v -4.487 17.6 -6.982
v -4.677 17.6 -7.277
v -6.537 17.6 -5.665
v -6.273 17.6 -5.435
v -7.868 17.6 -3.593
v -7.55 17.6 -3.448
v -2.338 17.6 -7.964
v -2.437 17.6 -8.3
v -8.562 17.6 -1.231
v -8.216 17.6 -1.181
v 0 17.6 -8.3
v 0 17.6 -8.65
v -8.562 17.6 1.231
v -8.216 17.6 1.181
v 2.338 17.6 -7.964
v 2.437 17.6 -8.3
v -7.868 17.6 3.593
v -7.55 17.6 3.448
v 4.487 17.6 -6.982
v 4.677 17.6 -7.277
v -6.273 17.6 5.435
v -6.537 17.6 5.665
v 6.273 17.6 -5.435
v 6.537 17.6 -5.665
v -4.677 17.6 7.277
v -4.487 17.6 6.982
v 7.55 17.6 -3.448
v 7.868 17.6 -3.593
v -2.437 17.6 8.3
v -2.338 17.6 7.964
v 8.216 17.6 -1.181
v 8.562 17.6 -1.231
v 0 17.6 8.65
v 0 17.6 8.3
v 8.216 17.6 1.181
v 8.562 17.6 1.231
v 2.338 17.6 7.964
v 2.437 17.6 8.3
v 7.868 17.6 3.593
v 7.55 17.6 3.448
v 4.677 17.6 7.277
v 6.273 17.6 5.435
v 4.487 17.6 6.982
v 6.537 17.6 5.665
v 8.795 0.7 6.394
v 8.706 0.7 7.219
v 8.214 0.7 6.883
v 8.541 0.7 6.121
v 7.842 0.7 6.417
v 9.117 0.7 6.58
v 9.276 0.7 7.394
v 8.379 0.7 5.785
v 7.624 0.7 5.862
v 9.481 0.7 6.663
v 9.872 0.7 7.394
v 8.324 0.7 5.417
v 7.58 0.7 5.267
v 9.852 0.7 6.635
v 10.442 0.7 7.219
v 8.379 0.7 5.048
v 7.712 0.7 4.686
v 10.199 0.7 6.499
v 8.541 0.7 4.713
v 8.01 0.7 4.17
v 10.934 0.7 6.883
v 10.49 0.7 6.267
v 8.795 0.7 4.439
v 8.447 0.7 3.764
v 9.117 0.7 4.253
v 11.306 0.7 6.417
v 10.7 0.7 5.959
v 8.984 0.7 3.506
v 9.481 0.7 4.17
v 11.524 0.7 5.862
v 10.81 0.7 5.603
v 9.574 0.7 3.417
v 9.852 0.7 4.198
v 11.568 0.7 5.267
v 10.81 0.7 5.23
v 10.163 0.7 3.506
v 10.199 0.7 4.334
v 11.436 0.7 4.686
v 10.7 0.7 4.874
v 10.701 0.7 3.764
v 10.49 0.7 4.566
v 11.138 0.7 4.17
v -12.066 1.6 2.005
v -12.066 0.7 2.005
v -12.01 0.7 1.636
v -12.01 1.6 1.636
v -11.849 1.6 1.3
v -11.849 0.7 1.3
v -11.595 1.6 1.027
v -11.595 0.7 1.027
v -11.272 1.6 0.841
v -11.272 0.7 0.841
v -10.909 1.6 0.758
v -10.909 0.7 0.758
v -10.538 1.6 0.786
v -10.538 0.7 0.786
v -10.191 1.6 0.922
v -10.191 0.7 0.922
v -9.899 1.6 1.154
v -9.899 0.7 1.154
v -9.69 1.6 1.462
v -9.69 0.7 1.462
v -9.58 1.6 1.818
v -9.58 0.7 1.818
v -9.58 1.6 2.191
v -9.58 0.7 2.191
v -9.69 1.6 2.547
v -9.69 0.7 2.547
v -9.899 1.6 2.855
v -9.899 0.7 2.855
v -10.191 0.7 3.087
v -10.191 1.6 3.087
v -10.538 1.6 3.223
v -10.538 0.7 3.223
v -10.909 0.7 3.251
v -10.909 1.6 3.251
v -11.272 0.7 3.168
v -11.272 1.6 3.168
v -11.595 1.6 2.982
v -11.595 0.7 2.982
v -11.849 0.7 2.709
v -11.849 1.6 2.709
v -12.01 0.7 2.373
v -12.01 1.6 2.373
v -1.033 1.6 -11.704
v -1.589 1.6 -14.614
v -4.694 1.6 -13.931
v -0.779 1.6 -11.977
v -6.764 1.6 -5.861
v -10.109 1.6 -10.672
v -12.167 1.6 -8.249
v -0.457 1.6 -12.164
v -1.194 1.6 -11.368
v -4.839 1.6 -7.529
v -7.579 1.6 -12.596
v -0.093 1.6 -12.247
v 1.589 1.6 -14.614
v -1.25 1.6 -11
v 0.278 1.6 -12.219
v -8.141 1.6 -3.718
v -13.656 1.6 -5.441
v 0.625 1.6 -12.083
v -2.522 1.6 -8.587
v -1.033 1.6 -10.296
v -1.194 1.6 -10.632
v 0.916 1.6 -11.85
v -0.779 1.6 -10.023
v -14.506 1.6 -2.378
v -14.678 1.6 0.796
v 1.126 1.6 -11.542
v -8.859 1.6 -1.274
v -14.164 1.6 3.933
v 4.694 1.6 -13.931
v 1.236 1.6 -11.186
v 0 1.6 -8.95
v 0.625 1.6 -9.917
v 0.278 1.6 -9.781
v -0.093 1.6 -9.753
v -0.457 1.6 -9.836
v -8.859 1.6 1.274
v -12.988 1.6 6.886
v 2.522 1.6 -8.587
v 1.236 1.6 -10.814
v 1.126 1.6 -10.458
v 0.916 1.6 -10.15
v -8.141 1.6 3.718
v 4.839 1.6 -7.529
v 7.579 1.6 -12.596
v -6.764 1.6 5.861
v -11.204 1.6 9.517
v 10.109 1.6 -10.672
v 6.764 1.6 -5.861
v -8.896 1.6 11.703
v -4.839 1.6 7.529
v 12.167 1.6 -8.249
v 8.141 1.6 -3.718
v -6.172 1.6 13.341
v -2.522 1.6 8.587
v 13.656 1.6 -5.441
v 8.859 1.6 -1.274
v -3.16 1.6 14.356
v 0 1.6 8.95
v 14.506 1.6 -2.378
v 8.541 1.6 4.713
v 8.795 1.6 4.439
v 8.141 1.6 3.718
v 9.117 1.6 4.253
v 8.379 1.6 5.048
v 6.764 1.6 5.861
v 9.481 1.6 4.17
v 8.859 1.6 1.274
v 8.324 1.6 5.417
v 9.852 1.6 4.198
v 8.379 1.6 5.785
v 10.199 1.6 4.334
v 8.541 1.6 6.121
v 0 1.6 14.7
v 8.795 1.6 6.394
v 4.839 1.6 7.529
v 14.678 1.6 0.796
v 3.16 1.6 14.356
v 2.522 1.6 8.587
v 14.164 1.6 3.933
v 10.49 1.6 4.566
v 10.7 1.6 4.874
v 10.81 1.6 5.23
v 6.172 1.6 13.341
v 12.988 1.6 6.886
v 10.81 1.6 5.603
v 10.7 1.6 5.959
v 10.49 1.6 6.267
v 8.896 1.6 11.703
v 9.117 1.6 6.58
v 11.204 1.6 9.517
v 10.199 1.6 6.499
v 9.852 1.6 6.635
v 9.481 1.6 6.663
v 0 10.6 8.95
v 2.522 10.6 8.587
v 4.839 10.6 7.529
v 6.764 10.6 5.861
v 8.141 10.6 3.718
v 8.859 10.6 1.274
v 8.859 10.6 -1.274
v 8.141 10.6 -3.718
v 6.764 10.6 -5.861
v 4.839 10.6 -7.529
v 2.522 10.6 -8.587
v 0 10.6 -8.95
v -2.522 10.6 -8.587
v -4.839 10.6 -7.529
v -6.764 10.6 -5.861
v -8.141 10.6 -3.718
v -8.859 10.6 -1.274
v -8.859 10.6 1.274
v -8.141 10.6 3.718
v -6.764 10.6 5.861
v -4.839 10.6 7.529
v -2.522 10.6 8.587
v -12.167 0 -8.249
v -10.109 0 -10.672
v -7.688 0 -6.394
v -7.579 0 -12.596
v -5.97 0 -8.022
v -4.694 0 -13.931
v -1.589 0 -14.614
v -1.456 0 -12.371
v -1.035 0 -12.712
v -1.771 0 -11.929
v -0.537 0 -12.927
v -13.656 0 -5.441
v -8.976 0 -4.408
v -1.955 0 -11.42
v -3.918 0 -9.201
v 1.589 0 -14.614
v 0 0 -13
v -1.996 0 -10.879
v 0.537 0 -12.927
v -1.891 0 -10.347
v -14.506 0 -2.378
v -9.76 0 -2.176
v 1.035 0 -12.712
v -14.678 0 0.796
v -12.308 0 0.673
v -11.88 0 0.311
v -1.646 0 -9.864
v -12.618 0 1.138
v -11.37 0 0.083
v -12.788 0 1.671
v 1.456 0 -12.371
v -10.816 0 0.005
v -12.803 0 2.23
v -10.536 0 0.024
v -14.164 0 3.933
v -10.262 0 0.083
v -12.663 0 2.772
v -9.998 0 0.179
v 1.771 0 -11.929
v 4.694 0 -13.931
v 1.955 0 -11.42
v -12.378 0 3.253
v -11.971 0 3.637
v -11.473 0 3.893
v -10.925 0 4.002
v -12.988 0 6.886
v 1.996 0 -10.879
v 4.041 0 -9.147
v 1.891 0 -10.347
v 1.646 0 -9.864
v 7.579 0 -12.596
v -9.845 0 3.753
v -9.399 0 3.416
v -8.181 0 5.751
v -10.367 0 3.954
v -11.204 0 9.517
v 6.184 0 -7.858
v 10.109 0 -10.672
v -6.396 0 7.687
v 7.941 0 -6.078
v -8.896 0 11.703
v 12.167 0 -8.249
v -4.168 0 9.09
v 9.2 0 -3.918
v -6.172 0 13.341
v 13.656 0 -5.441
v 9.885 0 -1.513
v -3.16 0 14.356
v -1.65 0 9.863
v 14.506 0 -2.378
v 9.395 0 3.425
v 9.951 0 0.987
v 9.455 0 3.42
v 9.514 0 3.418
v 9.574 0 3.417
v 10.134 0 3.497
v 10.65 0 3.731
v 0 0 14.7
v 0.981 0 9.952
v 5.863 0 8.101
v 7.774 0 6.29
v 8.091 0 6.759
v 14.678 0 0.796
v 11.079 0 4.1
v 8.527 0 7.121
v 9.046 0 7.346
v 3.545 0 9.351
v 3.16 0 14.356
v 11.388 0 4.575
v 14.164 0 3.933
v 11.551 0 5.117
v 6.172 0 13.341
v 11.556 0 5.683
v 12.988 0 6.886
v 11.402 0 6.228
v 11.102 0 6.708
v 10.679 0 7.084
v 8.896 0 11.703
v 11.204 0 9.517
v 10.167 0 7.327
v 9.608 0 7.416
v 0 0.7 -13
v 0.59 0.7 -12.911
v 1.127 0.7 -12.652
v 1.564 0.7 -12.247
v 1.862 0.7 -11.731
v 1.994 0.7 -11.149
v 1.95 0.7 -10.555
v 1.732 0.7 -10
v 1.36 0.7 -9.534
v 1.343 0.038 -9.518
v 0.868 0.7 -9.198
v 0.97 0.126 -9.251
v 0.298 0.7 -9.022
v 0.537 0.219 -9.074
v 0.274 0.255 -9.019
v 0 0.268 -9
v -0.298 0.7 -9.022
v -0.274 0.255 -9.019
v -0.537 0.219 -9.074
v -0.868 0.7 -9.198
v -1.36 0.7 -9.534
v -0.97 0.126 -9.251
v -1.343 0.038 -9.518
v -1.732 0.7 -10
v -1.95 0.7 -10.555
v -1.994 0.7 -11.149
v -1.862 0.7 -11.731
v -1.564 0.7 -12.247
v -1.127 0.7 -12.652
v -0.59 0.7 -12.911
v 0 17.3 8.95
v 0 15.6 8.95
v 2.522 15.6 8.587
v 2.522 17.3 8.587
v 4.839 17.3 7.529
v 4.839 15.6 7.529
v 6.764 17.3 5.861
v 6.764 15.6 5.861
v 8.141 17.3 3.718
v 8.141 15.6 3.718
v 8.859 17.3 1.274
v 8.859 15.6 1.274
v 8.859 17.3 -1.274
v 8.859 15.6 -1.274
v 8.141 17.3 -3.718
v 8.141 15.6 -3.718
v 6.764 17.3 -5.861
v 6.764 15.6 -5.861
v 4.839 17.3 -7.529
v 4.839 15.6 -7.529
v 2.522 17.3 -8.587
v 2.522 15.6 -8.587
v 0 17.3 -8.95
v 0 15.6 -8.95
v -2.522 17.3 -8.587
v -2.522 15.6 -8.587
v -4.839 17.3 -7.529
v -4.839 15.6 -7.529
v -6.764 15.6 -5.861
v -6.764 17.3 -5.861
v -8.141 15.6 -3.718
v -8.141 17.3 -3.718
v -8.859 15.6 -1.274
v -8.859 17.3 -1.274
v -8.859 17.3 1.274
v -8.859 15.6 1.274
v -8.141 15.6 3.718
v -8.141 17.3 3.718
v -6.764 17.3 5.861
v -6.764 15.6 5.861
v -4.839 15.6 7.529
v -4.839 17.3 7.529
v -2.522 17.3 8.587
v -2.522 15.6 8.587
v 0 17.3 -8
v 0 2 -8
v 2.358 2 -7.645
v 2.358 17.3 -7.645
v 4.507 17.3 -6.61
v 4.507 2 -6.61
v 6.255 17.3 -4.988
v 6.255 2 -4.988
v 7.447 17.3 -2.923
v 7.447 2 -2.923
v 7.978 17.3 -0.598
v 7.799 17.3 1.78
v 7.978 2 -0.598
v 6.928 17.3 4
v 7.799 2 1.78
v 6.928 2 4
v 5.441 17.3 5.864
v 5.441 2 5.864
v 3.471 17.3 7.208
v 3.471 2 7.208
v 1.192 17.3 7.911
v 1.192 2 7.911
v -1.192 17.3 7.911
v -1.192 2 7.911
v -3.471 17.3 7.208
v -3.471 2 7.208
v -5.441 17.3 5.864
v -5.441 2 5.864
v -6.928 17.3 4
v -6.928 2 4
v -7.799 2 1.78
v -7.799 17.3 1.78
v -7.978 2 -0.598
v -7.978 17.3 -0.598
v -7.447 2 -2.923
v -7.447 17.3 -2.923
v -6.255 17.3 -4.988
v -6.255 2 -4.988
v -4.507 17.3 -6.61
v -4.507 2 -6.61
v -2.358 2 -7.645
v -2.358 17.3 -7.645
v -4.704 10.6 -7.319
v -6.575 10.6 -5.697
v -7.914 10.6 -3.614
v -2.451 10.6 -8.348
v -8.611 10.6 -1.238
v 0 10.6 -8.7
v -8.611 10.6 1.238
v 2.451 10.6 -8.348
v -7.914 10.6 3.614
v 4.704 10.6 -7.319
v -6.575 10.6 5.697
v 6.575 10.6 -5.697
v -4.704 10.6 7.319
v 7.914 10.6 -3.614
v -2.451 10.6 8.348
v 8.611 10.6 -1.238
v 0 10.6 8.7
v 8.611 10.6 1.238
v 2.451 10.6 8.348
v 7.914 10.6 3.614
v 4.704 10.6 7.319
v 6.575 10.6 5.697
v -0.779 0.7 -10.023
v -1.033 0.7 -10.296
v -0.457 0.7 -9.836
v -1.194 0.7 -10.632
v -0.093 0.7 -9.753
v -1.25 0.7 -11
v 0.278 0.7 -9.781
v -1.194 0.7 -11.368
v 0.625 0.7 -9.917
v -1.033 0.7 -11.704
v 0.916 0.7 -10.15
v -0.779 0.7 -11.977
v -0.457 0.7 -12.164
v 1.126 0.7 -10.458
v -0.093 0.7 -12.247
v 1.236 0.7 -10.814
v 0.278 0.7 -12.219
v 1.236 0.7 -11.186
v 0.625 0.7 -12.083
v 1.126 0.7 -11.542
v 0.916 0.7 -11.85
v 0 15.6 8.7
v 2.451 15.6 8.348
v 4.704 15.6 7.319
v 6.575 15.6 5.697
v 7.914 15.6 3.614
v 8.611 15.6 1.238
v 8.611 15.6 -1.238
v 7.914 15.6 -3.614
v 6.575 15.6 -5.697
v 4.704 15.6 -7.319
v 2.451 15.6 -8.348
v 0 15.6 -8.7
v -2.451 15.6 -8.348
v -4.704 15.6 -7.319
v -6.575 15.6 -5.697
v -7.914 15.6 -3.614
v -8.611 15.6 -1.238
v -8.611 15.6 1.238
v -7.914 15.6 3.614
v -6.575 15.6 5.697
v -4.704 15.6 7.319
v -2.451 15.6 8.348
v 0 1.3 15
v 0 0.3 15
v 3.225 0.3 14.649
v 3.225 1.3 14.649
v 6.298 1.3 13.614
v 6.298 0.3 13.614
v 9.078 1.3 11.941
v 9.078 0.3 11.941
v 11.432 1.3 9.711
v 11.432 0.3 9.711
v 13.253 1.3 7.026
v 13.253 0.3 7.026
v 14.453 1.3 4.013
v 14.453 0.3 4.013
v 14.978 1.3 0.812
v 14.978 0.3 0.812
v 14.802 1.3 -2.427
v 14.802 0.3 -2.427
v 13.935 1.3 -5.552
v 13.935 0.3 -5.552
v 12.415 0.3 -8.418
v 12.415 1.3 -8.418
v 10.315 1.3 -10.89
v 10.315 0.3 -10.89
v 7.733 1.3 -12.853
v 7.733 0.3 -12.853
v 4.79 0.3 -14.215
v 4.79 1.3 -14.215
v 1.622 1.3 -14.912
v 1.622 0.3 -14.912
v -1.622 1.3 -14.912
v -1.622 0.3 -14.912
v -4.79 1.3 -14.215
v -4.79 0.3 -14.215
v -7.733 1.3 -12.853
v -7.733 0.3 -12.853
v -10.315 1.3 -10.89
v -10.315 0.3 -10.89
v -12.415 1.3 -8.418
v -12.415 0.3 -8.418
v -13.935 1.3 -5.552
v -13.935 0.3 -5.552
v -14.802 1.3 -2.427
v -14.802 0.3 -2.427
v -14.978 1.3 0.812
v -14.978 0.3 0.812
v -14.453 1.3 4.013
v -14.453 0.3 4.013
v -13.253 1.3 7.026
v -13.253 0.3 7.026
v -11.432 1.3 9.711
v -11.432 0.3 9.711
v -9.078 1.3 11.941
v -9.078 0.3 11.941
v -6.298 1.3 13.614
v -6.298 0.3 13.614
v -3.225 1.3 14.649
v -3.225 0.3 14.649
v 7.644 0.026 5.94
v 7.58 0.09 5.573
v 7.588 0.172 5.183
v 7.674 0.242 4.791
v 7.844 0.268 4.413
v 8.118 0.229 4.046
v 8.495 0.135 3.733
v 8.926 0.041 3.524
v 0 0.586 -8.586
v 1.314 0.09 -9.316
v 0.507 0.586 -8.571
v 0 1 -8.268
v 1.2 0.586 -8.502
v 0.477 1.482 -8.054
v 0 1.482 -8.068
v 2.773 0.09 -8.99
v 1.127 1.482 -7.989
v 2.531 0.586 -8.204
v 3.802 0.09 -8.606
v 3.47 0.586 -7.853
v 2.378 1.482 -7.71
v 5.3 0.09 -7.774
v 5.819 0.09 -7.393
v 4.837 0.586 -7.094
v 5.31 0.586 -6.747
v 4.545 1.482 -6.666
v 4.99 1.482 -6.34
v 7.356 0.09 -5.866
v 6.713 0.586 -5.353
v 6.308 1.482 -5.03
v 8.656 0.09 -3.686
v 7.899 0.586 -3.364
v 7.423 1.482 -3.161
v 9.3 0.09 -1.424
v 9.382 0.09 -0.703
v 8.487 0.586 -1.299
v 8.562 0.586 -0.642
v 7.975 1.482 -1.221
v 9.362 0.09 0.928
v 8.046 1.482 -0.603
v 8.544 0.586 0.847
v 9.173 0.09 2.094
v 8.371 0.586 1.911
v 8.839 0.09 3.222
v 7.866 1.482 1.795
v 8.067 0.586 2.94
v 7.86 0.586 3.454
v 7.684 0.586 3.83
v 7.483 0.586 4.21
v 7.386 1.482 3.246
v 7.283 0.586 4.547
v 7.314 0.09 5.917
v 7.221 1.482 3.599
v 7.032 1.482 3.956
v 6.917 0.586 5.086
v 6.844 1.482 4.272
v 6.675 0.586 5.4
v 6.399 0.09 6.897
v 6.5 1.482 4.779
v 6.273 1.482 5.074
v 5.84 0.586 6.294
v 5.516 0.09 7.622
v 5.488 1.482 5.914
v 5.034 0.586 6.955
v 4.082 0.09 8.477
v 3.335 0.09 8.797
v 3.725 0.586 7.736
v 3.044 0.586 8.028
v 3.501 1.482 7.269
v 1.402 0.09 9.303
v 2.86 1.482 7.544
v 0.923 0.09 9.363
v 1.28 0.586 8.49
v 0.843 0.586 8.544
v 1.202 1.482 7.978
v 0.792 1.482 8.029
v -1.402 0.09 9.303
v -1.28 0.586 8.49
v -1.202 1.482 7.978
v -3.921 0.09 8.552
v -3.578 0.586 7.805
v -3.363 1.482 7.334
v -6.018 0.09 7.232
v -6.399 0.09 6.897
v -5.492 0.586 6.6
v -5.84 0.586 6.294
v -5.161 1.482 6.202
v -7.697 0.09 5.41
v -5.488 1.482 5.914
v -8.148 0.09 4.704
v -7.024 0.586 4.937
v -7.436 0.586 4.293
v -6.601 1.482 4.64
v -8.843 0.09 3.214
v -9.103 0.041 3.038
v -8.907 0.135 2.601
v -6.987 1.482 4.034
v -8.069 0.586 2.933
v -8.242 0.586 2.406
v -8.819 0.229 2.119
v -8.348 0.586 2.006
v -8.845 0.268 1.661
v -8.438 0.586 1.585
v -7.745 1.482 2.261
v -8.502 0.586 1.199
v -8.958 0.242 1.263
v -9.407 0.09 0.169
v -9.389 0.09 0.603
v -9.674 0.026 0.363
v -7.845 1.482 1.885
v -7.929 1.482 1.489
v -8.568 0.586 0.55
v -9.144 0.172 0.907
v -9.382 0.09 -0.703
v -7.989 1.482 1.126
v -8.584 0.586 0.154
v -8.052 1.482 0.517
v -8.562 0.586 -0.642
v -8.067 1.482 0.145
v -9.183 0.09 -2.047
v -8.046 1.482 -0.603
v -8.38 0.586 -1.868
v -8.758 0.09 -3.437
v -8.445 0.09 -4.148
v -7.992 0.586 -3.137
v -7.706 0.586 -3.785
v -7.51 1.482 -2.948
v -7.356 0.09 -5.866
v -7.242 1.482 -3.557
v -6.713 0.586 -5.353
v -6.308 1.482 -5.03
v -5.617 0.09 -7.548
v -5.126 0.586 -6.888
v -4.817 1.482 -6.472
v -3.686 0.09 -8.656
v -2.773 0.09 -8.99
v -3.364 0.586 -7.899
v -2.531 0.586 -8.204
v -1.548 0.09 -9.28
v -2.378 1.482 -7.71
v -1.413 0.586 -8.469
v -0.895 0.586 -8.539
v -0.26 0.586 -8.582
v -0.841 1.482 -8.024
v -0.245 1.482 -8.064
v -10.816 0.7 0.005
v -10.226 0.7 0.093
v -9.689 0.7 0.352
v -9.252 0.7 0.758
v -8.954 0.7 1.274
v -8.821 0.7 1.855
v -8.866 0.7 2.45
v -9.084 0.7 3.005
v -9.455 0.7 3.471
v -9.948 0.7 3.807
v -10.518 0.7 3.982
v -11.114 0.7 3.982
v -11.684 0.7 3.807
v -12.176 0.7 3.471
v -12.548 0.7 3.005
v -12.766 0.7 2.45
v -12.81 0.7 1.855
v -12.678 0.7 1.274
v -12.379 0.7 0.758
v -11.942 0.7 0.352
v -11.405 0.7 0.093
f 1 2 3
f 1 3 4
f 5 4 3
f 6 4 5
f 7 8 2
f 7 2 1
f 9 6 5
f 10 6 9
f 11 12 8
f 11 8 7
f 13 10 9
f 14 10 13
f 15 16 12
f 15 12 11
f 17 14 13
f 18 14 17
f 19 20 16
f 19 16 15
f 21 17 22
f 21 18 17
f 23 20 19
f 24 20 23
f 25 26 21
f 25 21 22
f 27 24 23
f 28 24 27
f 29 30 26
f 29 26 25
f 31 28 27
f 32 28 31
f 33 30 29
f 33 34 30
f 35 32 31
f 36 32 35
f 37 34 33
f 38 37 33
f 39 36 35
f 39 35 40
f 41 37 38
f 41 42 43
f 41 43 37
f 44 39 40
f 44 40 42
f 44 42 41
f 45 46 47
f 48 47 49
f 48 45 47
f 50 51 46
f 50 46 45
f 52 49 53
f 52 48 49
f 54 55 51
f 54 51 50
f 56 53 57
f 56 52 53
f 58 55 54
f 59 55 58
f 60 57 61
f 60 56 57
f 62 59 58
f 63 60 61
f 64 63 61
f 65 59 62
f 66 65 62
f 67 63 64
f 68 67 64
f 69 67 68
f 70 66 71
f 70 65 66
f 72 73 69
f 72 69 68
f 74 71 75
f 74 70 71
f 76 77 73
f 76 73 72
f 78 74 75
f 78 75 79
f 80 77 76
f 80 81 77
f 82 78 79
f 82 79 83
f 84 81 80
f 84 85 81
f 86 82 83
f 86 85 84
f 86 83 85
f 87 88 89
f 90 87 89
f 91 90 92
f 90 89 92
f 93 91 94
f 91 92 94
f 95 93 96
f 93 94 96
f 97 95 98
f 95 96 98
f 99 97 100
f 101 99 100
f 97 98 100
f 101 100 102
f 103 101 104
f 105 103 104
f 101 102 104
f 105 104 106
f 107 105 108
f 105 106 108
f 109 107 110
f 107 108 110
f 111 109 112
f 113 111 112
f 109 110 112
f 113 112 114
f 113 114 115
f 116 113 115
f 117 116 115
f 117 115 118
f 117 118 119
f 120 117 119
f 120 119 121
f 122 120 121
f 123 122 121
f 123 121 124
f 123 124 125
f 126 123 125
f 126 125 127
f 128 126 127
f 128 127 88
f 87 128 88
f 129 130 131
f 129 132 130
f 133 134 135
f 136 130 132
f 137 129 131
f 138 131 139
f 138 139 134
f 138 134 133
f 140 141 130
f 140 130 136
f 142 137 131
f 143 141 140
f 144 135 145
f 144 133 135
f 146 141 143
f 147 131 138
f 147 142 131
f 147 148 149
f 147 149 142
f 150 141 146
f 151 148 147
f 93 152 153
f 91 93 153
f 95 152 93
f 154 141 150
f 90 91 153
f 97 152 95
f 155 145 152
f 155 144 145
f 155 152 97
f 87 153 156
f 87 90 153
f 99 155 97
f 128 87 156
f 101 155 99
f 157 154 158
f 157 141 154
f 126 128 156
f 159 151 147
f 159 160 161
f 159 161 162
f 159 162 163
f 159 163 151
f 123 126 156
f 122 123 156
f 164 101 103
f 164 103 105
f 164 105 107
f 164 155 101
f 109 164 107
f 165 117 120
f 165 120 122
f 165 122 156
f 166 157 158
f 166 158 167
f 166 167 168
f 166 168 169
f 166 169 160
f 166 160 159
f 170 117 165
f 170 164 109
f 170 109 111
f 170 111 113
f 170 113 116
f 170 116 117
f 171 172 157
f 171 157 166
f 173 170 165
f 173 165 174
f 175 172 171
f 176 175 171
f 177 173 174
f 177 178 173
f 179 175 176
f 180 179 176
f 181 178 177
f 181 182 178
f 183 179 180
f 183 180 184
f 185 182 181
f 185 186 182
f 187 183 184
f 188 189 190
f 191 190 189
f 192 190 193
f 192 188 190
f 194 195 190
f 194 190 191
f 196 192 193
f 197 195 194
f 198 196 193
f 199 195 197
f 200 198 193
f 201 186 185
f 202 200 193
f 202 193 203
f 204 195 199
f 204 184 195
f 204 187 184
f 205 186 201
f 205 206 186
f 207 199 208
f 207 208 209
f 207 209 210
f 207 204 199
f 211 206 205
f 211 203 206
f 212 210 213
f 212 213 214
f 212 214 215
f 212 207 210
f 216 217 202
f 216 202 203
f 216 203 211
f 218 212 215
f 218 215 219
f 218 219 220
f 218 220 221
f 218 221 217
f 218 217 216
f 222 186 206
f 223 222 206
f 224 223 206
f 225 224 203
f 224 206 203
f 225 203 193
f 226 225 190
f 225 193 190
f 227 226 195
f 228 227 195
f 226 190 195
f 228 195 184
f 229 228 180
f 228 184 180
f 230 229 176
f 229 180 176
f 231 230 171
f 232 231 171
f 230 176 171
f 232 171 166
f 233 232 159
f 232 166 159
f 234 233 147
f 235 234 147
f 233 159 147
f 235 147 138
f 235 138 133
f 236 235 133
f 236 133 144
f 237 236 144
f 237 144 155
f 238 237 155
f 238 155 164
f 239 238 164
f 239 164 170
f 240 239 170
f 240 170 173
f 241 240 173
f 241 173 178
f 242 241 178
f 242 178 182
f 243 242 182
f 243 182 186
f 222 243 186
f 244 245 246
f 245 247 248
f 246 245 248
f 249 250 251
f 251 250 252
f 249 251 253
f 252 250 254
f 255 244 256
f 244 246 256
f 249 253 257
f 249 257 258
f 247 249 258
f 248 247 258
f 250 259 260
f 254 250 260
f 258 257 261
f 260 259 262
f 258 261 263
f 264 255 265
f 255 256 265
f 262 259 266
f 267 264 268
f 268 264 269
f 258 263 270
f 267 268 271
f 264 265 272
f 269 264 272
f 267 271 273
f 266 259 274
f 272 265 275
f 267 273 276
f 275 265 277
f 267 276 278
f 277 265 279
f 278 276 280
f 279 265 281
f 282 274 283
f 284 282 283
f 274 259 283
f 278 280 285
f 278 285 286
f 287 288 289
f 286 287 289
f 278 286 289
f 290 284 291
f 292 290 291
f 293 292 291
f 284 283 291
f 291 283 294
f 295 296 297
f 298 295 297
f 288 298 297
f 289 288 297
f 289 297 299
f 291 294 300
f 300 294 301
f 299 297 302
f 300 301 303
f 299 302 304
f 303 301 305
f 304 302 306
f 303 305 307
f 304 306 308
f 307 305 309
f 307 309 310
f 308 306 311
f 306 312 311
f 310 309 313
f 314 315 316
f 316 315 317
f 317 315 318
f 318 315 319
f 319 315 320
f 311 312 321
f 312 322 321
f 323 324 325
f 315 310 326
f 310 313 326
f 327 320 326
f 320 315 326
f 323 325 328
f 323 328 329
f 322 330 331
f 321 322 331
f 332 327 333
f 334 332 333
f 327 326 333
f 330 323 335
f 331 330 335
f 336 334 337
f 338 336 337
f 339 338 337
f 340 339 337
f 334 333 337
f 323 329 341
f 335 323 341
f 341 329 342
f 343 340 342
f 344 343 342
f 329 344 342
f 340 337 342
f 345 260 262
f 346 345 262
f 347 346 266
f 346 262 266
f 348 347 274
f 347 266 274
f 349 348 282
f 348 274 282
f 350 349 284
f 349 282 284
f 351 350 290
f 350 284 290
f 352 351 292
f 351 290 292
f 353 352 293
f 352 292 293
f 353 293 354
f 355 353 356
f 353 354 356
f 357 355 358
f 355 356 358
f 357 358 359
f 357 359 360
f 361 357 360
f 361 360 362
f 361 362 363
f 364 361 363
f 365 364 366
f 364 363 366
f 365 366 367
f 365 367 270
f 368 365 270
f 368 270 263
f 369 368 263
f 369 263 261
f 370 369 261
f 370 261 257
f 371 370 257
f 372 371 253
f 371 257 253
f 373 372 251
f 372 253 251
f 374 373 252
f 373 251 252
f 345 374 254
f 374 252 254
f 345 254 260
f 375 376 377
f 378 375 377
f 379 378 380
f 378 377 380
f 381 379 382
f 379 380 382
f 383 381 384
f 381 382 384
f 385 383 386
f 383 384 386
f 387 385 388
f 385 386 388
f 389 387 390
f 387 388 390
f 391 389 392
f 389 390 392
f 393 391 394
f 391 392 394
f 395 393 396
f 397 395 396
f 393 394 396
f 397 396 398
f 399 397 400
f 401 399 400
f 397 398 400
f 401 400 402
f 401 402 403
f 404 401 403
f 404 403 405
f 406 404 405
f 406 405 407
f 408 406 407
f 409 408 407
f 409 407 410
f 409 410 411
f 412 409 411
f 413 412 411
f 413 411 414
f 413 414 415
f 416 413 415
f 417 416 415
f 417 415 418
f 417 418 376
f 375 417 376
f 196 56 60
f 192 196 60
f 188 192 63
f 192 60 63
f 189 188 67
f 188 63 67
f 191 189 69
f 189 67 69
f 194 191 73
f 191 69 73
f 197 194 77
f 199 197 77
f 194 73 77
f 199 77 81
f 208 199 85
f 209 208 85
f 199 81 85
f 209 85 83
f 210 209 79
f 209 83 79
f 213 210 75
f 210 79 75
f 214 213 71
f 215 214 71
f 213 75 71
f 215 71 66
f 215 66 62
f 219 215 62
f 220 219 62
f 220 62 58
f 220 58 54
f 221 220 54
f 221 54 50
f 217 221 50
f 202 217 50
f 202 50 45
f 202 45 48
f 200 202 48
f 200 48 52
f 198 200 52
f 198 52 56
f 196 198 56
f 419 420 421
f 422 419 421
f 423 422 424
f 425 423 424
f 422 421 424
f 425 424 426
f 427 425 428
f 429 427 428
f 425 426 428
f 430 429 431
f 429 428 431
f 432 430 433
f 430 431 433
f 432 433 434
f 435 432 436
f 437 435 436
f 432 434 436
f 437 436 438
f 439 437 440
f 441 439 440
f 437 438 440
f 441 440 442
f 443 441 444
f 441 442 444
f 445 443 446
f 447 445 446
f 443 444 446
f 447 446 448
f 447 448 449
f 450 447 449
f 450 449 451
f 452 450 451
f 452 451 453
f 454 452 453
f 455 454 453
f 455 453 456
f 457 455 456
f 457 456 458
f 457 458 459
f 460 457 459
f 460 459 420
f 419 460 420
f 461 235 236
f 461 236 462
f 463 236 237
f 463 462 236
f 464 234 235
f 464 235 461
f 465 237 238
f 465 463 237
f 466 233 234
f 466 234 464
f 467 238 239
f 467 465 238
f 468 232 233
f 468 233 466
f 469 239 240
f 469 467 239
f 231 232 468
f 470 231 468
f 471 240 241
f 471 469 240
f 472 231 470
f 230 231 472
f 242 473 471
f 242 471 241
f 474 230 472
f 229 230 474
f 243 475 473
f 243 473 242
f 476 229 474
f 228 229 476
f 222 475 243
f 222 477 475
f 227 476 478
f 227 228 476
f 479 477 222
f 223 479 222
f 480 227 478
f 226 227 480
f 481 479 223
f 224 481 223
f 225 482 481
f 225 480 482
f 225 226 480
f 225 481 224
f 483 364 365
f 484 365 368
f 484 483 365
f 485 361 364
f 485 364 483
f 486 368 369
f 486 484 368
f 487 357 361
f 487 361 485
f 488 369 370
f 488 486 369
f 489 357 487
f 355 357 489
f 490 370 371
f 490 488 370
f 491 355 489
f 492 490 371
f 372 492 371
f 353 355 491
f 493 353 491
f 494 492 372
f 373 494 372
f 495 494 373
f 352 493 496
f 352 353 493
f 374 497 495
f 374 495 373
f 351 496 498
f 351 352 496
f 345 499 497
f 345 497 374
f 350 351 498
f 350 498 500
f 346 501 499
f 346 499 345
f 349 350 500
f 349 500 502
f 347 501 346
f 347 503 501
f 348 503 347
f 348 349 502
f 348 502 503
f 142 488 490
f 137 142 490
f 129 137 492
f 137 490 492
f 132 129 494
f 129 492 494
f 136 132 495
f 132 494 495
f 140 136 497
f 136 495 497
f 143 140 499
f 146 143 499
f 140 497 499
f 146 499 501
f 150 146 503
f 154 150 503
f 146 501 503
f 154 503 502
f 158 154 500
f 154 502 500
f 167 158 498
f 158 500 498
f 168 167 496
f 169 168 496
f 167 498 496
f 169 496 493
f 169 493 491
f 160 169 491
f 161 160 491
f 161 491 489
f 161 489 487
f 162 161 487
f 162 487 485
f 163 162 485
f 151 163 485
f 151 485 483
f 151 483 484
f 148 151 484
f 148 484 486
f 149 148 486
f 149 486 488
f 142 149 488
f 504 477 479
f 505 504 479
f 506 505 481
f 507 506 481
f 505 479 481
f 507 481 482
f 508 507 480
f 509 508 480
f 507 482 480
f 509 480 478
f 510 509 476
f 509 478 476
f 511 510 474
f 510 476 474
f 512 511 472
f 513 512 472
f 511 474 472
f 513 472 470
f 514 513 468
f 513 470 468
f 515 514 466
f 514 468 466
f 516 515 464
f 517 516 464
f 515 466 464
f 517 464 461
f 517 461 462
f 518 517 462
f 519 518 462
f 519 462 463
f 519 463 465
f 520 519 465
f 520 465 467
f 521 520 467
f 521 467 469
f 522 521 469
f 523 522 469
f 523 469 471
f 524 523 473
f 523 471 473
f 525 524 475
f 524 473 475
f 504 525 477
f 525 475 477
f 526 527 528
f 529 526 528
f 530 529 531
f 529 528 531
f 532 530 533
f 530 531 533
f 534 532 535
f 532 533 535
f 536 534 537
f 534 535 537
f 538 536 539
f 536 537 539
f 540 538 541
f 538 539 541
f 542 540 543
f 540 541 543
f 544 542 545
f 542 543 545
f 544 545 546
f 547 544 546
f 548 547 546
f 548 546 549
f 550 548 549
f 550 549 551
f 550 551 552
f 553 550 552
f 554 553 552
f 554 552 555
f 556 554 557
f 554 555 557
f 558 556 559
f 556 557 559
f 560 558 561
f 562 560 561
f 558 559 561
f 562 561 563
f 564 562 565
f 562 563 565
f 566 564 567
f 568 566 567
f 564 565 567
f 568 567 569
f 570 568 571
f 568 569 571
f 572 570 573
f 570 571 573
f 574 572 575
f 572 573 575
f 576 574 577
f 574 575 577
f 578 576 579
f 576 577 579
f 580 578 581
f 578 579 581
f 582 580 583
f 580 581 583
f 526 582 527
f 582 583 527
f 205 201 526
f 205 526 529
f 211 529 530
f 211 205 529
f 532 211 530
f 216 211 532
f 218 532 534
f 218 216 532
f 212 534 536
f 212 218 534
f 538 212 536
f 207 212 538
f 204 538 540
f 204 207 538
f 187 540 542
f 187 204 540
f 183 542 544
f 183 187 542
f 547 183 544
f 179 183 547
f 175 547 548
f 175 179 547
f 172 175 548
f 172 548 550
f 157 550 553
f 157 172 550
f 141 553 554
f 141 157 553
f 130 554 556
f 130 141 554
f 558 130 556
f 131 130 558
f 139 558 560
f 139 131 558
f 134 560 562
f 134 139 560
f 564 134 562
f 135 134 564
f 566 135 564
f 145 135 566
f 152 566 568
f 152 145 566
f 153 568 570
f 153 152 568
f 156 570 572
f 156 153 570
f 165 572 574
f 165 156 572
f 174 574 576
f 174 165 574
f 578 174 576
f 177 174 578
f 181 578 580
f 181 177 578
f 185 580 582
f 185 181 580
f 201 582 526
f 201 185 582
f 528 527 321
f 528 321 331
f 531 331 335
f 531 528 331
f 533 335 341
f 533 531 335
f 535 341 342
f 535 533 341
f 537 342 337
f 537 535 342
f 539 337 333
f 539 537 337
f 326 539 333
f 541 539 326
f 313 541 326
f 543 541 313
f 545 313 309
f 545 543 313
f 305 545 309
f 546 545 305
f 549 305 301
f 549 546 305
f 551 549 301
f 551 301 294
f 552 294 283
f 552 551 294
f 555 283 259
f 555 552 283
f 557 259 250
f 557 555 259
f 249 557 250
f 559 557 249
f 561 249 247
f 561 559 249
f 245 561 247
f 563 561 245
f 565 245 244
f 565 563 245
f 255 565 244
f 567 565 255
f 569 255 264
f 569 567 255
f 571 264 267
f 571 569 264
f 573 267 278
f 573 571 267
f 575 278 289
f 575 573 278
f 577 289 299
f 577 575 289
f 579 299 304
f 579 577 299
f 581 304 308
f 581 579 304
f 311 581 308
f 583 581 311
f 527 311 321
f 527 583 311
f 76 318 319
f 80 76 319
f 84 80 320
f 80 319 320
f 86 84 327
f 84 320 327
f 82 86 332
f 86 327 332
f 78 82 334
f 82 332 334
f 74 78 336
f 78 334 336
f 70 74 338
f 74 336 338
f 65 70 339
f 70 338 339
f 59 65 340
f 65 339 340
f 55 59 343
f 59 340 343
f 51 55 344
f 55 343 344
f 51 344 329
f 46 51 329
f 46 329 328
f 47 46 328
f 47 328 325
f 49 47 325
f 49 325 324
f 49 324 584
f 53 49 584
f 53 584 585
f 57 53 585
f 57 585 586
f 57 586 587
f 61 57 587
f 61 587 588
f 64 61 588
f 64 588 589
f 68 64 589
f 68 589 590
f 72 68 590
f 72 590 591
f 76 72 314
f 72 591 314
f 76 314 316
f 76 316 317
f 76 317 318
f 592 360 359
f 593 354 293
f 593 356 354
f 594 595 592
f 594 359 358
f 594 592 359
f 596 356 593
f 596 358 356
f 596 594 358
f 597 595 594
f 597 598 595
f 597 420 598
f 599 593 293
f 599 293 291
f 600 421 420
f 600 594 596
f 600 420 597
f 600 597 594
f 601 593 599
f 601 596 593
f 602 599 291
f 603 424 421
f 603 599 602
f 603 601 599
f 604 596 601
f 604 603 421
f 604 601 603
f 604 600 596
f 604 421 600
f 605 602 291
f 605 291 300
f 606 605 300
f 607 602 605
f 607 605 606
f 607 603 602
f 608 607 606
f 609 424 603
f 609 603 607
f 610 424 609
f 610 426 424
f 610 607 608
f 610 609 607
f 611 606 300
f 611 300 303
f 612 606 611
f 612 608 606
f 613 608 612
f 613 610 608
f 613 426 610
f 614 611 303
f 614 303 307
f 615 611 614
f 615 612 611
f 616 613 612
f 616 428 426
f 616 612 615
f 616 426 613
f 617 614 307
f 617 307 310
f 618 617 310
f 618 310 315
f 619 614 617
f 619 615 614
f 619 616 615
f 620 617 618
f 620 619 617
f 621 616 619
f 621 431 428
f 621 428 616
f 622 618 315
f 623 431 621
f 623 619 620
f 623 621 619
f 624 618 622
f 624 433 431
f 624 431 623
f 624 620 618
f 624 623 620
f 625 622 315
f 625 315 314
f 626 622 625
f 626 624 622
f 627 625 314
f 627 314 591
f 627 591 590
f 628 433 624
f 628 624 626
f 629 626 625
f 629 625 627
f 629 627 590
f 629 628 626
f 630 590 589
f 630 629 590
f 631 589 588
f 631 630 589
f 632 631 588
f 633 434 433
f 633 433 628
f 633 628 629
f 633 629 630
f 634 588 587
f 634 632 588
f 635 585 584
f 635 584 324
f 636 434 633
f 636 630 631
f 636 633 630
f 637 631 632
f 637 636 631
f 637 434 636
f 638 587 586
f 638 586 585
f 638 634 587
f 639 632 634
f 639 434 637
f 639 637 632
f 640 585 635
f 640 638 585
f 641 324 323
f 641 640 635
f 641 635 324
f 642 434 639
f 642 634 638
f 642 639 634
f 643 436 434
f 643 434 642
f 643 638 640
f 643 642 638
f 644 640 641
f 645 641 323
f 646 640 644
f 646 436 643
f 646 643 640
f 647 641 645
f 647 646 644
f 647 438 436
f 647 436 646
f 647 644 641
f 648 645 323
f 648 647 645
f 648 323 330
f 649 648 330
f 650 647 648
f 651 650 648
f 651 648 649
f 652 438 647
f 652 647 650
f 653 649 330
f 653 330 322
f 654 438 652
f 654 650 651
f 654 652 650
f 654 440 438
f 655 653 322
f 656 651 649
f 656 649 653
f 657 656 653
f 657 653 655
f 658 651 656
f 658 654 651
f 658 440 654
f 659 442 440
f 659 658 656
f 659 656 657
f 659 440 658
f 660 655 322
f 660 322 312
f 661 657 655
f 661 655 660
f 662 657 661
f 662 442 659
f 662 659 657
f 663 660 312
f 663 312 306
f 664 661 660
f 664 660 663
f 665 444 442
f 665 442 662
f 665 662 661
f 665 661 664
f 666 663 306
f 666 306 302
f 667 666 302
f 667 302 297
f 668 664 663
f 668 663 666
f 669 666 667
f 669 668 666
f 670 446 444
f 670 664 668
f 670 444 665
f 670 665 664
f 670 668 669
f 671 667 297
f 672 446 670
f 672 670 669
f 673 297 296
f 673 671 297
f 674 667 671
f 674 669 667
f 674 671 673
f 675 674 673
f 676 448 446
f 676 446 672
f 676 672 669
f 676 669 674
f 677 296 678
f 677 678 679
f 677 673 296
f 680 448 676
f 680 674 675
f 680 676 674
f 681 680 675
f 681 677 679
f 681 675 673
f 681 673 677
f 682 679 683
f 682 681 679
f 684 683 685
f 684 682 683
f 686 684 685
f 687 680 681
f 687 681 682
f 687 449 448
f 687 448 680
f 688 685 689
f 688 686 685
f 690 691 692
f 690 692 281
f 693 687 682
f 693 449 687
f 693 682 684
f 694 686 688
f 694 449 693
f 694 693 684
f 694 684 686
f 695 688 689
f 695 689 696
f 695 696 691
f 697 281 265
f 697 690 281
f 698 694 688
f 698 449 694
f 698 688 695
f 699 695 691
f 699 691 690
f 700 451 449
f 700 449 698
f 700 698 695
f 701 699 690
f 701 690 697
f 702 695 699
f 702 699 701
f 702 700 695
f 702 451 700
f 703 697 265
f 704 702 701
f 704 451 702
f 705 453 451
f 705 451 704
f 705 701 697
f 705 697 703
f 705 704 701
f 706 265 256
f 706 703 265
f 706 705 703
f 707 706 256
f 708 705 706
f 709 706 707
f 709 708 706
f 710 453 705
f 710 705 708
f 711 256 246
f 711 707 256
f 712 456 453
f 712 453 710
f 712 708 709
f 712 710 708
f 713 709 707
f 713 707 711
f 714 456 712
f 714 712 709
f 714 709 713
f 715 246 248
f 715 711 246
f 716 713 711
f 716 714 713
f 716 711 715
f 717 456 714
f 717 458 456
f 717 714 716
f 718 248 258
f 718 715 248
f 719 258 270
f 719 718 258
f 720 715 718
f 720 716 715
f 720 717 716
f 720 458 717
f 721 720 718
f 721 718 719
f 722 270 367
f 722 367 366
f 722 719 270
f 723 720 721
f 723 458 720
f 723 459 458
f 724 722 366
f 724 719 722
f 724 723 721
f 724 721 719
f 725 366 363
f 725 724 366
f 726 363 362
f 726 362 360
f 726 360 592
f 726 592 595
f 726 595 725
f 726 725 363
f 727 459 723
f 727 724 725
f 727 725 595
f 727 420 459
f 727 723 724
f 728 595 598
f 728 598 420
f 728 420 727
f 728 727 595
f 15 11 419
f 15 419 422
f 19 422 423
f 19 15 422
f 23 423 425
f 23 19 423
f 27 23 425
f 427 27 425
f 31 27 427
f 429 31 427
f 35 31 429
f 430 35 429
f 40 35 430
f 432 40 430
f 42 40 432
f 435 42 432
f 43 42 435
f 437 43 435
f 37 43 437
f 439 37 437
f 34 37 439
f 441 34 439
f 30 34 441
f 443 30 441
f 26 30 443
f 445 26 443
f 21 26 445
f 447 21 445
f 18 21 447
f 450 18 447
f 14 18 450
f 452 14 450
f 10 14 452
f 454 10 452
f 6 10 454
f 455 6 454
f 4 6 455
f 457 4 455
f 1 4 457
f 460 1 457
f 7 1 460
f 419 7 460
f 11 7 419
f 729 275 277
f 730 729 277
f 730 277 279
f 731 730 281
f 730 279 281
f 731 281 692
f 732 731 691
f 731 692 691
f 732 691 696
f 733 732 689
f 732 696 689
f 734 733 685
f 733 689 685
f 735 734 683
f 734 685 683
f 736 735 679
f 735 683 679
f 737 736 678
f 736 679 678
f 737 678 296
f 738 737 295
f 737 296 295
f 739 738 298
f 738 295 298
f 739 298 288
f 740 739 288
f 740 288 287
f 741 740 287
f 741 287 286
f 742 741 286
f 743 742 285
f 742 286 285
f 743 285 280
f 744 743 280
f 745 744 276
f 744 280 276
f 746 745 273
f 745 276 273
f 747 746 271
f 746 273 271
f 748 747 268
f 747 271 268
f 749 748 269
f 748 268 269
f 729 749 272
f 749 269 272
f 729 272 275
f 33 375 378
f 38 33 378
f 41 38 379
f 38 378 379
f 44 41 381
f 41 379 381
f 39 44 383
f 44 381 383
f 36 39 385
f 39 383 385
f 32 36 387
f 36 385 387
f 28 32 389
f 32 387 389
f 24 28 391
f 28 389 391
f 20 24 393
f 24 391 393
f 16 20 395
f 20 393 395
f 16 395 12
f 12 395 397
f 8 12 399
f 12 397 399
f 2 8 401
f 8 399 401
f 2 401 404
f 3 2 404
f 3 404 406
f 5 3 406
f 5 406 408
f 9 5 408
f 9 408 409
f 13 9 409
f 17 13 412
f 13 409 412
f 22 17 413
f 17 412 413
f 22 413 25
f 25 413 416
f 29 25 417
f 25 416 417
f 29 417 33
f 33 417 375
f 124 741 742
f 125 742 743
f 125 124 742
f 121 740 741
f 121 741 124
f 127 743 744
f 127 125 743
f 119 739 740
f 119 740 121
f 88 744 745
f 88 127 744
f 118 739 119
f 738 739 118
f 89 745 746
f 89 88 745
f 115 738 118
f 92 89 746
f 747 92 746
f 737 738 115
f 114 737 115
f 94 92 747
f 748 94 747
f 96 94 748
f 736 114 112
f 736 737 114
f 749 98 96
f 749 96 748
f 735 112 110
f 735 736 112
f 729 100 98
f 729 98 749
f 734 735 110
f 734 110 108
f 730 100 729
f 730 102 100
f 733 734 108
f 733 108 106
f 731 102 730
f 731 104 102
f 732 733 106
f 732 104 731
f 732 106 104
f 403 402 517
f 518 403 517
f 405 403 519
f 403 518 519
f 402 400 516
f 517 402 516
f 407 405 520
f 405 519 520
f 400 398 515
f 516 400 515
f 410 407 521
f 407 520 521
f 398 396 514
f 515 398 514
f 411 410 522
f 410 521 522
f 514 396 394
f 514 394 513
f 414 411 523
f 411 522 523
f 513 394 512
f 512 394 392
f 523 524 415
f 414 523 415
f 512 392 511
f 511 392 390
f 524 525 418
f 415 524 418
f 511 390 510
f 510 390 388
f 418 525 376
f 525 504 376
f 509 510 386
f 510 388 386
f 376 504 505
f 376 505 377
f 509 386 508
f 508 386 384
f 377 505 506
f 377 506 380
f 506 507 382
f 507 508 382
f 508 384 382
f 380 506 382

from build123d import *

# Parameters (mm, degrees)
SKETCH_1_R          = 15
EXTRUDE_1_DEPTH     = 1.6
SKETCH_2_R          = 8.95
EXTRUDE_2_DEPTH     = 16
SKETCH_3_R          = 8
CUT_EXTRUDE_1_DEPTH = 28.563744303
FILLET_1_R          = 2
MM_1_D              = 2.5
SKETCH_6_R          = 2
CUT_EXTRUDE_2_DEPTH = 0.7
CUT_EXTRUDE_START   = -7
SKETCH_7_R          = 8.95
SKETCH_7_R_2        = 8.7
CUT_EXTRUDE_3_DEPTH = 5
CHAMFER_1_SIZE      = 0.3


with BuildPart() as part:
    # 草图1 → 凸台-拉伸1 (new body)
    with BuildSketch(Plane(origin=(0, 0, 0), x_dir=(1, 0, 0), z_dir=(0, 1, 0))):
        with Locations(Location((0, 0, 0), (0, 0, 270))):
            Circle(SKETCH_1_R)
    extrude(amount=EXTRUDE_1_DEPTH)

    # 草图2 → 凸台-拉伸2 (add)
    with BuildSketch(Plane(origin=(0, 1.6, 0), x_dir=(1, 0, 0), z_dir=(0, 1, 0))):
        with Locations(Location((0, 0, 0), (0, 0, 270))):
            Circle(SKETCH_2_R)
    extrude(amount=EXTRUDE_2_DEPTH)

    # 草图3 → 切除-拉伸1 (cut, through all)
    with BuildSketch(Plane(origin=(0, 0, 0), x_dir=(-1, 0, 0), z_dir=(0, -1, 0))):
        with Locations(Location((0, 0, 0), (0, 0, 90))):
            Circle(SKETCH_3_R)
    extrude(amount=-CUT_EXTRUDE_1_DEPTH, mode=Mode.SUBTRACT)

    # 圆角1
    fillet_1_edges = [part.edges().sort_by_distance(p)[0] for p in [
        (0, 0, 8),
    ]]
    fillet(fillet_1_edges, radius=FILLET_1_R)

    # 大小mm 暗销孔1 (through all)
    with Locations(Plane(origin=(0, 1.6, 0), x_dir=(1, 0, 0), z_dir=(0, 1, 0))):
        with Locations((0, 11), (9.573912655, -5.416659161), (-10.815803983, -2.00459078)):
            Hole(MM_1_D / 2)

    # 草图6 → 切除-拉伸2 (cut)
    with BuildSketch(Plane(origin=(0, 0, 0), x_dir=(-1, 0, 0), z_dir=(0, -1, 0))):
        with Locations(Location((0, 11, 0), (0, 0, 90))):
            Circle(SKETCH_6_R)
        with Locations(Location((10.815803983, -2.00459078, 0), (0, 0, 90))):
            Circle(SKETCH_6_R)
        with Locations(Location((-9.573912655, -5.416659161, 0), (0, 0, 90))):
            Circle(SKETCH_6_R)
    extrude(amount=-CUT_EXTRUDE_2_DEPTH, mode=Mode.SUBTRACT)

    # 草图7 → 切除-拉伸3 (cut)
    with BuildSketch(Plane(origin=(0, 17.6, 0), x_dir=(1, 0, 0), z_dir=(0, 1, 0)).offset(CUT_EXTRUDE_START)):
        with Locations(Location((0, 0, 0), (0, 0, 270))):
            Circle(SKETCH_7_R)
        with Locations(Location((0, 0, 0), (0, 0, 270))):
            Circle(SKETCH_7_R_2, mode=Mode.SUBTRACT)
    extrude(amount=CUT_EXTRUDE_3_DEPTH, mode=Mode.SUBTRACT)

    # 倒角1
    chamfer_1_edges = [part.edges().sort_by_distance(p)[0] for p in [
        (0, 17.6, 8),
        (0, 0, -15),
        (0, 1.6, -15),
        (0, 17.6, -8.95),
    ]]
    chamfer(chamfer_1_edges, length=CHAMFER_1_SIZE)


solid = part.part
